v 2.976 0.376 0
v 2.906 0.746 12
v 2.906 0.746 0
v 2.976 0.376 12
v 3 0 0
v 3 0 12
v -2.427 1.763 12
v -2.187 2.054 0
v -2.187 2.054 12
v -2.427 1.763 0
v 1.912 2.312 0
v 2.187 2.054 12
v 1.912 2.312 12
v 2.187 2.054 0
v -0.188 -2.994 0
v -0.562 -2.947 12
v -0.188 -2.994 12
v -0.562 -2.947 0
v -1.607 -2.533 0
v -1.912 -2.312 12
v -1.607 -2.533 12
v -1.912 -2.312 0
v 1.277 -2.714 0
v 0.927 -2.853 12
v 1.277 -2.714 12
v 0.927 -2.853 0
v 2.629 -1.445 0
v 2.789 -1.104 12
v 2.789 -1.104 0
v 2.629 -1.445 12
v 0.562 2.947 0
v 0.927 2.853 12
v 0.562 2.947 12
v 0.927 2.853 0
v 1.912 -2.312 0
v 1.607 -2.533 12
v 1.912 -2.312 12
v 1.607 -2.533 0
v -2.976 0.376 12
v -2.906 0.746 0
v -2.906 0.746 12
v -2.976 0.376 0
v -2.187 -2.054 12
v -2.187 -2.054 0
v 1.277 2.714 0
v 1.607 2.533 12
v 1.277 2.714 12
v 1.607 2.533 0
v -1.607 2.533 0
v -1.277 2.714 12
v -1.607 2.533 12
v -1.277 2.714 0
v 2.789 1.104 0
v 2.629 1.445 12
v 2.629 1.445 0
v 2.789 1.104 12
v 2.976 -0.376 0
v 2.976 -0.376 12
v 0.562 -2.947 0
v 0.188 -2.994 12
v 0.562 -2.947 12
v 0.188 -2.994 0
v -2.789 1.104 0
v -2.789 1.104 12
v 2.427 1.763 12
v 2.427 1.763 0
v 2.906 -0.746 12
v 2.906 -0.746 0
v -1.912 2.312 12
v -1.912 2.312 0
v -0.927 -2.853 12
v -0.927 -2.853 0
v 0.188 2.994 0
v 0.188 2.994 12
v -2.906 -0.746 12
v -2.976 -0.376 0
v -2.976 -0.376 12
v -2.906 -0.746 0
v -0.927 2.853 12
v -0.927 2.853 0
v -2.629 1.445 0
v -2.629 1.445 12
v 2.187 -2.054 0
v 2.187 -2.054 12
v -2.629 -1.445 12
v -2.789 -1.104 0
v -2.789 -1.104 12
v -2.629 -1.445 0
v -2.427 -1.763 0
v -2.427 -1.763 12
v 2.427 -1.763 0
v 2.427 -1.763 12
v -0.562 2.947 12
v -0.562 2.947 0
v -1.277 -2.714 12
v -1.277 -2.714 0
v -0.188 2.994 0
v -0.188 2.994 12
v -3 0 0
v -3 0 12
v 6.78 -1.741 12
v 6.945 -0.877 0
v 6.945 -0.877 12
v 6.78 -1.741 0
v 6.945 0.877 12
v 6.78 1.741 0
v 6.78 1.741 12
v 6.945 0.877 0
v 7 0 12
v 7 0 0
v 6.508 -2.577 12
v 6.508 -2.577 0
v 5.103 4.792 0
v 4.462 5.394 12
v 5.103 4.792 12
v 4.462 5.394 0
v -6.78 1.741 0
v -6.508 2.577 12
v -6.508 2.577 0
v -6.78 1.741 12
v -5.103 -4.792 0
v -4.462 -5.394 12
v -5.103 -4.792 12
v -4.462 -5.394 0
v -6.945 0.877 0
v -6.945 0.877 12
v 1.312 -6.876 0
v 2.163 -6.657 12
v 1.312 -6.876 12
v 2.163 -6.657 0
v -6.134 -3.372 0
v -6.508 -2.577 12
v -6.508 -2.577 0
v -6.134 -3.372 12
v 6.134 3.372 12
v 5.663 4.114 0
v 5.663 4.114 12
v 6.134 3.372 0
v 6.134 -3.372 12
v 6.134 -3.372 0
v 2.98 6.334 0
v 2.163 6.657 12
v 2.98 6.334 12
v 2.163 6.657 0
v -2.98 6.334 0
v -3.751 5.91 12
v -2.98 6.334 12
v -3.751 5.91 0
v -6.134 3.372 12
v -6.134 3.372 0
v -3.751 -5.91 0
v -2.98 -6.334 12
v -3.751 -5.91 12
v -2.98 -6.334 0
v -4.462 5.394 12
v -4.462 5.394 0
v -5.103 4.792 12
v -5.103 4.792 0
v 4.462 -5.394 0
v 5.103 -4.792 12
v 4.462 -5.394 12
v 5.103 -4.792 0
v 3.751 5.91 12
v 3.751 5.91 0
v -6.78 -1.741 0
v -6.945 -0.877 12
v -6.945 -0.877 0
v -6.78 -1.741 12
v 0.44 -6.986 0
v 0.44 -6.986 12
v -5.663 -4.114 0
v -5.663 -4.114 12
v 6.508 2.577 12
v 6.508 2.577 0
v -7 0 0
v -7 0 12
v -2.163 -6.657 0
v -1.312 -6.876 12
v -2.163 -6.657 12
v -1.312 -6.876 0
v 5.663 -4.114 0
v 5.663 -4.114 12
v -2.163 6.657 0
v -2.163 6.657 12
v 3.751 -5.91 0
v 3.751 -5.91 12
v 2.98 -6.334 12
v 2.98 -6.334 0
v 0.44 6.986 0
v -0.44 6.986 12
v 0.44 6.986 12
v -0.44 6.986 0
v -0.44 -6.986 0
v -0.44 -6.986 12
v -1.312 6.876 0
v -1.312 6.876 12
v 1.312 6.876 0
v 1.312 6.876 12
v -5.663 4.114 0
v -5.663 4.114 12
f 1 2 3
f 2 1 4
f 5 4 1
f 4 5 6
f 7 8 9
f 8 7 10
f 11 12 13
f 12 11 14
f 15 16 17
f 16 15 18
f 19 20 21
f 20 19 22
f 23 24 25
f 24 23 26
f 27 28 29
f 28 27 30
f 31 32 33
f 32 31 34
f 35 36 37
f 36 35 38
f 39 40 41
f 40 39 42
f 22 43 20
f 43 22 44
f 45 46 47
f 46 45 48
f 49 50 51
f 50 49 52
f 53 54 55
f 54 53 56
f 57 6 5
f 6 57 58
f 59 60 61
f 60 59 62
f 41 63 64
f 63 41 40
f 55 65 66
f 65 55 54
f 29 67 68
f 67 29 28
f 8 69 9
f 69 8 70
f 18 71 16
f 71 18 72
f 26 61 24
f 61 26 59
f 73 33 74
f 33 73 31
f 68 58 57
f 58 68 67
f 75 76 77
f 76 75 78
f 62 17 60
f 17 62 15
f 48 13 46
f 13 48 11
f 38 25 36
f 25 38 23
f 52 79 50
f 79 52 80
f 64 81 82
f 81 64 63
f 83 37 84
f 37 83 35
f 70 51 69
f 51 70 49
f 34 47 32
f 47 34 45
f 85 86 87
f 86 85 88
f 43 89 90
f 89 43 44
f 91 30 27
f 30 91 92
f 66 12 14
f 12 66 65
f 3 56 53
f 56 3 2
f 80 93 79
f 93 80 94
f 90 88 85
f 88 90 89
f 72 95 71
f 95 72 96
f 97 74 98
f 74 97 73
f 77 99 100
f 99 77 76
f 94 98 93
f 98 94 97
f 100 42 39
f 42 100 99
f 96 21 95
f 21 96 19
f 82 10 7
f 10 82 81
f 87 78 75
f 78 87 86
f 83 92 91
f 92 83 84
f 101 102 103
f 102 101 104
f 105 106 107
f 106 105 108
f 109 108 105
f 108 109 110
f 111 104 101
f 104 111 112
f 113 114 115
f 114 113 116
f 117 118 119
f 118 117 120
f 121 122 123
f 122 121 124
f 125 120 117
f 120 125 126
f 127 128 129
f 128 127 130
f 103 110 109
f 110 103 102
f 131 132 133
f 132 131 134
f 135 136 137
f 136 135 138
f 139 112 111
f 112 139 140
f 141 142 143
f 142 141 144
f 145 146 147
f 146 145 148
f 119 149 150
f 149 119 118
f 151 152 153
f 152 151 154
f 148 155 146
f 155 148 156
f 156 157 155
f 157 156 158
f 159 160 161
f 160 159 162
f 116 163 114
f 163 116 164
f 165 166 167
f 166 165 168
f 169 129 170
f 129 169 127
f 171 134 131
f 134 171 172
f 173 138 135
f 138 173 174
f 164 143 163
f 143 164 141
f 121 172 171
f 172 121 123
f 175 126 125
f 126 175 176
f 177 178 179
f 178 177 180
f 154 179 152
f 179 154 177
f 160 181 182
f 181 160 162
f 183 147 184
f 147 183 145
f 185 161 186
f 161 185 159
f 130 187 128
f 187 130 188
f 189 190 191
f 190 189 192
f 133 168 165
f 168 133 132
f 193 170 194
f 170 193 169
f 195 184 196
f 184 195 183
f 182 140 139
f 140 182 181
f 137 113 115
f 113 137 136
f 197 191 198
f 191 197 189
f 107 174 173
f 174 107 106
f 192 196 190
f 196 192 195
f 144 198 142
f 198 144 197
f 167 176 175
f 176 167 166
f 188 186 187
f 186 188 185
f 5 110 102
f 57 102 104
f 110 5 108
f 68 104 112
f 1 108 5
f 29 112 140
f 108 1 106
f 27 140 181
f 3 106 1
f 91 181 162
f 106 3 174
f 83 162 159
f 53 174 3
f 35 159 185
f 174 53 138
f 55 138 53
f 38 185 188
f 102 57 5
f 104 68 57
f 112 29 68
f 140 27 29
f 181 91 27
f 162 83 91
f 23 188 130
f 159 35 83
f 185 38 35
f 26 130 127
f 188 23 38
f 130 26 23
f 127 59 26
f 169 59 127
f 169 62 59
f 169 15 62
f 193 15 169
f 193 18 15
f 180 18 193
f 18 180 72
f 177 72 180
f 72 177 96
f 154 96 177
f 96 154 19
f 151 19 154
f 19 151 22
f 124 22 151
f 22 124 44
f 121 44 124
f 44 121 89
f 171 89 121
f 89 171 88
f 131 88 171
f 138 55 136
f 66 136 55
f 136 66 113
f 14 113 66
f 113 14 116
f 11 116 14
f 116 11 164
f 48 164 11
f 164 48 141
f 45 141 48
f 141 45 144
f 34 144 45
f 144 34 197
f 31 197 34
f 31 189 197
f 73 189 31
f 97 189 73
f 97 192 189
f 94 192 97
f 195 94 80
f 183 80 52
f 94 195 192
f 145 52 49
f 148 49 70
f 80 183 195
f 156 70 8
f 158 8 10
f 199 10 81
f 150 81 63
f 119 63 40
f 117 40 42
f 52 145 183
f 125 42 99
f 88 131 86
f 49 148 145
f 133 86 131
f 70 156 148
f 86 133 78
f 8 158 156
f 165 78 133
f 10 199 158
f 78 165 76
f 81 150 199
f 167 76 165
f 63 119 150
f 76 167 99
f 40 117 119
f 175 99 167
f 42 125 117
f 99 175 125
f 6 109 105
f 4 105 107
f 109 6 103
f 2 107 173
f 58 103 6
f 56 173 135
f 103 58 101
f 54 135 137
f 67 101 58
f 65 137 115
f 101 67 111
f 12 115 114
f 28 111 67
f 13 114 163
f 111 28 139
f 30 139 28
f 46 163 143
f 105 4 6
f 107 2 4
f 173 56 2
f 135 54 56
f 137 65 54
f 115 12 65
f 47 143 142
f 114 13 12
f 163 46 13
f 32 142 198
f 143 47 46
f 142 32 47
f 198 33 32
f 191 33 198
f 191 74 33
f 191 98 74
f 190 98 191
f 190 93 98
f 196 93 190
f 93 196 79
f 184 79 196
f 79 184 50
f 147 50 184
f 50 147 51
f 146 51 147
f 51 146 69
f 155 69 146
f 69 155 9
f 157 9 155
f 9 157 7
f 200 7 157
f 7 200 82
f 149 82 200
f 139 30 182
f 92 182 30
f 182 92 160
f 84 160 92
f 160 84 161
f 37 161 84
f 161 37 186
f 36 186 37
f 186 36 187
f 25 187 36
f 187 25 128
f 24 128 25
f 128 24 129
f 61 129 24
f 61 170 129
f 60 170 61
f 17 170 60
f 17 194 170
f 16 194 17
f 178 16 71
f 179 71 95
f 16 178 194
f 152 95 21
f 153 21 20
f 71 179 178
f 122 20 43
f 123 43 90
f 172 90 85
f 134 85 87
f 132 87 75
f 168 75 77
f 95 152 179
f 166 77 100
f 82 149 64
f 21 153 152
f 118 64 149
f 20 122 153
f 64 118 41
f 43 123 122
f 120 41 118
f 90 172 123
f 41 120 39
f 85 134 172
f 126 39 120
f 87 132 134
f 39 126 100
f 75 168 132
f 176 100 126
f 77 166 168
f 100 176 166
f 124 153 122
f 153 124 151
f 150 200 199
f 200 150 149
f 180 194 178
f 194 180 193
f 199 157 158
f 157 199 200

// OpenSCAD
$fn = 50;


difference() {
	union() {
		*color(alpha = 1.0000000000, c = "gray") {
			translate(v = [0, 7, 0]) {
				linear_extrude(height = 1) {
					text(font = "Arial:style=Bold", halign = "center", size = 4.5000000000, text = "COMMENT plate main", valign = "center");
				}
			}
		}
		cylinder(h = 12, r = 7.0000000000);
	}
	union() {
		*color(alpha = 1.0000000000, c = "gray") {
			translate(v = [0, 7, 0]) {
				linear_extrude(height = 1) {
					text(font = "Arial:style=Bold", halign = "center", size = 4.5000000000, text = "COMMENT holes main", valign = "center");
				}
			}
		}
		translate(v = [0, 0, -100]) {
			cylinder(h = 200, r = 3.0000000000);
		}
		translate(v = [0, 0, -100]) {
			cylinder(h = 200, r = 1.5000000000);
		}
	}
}
